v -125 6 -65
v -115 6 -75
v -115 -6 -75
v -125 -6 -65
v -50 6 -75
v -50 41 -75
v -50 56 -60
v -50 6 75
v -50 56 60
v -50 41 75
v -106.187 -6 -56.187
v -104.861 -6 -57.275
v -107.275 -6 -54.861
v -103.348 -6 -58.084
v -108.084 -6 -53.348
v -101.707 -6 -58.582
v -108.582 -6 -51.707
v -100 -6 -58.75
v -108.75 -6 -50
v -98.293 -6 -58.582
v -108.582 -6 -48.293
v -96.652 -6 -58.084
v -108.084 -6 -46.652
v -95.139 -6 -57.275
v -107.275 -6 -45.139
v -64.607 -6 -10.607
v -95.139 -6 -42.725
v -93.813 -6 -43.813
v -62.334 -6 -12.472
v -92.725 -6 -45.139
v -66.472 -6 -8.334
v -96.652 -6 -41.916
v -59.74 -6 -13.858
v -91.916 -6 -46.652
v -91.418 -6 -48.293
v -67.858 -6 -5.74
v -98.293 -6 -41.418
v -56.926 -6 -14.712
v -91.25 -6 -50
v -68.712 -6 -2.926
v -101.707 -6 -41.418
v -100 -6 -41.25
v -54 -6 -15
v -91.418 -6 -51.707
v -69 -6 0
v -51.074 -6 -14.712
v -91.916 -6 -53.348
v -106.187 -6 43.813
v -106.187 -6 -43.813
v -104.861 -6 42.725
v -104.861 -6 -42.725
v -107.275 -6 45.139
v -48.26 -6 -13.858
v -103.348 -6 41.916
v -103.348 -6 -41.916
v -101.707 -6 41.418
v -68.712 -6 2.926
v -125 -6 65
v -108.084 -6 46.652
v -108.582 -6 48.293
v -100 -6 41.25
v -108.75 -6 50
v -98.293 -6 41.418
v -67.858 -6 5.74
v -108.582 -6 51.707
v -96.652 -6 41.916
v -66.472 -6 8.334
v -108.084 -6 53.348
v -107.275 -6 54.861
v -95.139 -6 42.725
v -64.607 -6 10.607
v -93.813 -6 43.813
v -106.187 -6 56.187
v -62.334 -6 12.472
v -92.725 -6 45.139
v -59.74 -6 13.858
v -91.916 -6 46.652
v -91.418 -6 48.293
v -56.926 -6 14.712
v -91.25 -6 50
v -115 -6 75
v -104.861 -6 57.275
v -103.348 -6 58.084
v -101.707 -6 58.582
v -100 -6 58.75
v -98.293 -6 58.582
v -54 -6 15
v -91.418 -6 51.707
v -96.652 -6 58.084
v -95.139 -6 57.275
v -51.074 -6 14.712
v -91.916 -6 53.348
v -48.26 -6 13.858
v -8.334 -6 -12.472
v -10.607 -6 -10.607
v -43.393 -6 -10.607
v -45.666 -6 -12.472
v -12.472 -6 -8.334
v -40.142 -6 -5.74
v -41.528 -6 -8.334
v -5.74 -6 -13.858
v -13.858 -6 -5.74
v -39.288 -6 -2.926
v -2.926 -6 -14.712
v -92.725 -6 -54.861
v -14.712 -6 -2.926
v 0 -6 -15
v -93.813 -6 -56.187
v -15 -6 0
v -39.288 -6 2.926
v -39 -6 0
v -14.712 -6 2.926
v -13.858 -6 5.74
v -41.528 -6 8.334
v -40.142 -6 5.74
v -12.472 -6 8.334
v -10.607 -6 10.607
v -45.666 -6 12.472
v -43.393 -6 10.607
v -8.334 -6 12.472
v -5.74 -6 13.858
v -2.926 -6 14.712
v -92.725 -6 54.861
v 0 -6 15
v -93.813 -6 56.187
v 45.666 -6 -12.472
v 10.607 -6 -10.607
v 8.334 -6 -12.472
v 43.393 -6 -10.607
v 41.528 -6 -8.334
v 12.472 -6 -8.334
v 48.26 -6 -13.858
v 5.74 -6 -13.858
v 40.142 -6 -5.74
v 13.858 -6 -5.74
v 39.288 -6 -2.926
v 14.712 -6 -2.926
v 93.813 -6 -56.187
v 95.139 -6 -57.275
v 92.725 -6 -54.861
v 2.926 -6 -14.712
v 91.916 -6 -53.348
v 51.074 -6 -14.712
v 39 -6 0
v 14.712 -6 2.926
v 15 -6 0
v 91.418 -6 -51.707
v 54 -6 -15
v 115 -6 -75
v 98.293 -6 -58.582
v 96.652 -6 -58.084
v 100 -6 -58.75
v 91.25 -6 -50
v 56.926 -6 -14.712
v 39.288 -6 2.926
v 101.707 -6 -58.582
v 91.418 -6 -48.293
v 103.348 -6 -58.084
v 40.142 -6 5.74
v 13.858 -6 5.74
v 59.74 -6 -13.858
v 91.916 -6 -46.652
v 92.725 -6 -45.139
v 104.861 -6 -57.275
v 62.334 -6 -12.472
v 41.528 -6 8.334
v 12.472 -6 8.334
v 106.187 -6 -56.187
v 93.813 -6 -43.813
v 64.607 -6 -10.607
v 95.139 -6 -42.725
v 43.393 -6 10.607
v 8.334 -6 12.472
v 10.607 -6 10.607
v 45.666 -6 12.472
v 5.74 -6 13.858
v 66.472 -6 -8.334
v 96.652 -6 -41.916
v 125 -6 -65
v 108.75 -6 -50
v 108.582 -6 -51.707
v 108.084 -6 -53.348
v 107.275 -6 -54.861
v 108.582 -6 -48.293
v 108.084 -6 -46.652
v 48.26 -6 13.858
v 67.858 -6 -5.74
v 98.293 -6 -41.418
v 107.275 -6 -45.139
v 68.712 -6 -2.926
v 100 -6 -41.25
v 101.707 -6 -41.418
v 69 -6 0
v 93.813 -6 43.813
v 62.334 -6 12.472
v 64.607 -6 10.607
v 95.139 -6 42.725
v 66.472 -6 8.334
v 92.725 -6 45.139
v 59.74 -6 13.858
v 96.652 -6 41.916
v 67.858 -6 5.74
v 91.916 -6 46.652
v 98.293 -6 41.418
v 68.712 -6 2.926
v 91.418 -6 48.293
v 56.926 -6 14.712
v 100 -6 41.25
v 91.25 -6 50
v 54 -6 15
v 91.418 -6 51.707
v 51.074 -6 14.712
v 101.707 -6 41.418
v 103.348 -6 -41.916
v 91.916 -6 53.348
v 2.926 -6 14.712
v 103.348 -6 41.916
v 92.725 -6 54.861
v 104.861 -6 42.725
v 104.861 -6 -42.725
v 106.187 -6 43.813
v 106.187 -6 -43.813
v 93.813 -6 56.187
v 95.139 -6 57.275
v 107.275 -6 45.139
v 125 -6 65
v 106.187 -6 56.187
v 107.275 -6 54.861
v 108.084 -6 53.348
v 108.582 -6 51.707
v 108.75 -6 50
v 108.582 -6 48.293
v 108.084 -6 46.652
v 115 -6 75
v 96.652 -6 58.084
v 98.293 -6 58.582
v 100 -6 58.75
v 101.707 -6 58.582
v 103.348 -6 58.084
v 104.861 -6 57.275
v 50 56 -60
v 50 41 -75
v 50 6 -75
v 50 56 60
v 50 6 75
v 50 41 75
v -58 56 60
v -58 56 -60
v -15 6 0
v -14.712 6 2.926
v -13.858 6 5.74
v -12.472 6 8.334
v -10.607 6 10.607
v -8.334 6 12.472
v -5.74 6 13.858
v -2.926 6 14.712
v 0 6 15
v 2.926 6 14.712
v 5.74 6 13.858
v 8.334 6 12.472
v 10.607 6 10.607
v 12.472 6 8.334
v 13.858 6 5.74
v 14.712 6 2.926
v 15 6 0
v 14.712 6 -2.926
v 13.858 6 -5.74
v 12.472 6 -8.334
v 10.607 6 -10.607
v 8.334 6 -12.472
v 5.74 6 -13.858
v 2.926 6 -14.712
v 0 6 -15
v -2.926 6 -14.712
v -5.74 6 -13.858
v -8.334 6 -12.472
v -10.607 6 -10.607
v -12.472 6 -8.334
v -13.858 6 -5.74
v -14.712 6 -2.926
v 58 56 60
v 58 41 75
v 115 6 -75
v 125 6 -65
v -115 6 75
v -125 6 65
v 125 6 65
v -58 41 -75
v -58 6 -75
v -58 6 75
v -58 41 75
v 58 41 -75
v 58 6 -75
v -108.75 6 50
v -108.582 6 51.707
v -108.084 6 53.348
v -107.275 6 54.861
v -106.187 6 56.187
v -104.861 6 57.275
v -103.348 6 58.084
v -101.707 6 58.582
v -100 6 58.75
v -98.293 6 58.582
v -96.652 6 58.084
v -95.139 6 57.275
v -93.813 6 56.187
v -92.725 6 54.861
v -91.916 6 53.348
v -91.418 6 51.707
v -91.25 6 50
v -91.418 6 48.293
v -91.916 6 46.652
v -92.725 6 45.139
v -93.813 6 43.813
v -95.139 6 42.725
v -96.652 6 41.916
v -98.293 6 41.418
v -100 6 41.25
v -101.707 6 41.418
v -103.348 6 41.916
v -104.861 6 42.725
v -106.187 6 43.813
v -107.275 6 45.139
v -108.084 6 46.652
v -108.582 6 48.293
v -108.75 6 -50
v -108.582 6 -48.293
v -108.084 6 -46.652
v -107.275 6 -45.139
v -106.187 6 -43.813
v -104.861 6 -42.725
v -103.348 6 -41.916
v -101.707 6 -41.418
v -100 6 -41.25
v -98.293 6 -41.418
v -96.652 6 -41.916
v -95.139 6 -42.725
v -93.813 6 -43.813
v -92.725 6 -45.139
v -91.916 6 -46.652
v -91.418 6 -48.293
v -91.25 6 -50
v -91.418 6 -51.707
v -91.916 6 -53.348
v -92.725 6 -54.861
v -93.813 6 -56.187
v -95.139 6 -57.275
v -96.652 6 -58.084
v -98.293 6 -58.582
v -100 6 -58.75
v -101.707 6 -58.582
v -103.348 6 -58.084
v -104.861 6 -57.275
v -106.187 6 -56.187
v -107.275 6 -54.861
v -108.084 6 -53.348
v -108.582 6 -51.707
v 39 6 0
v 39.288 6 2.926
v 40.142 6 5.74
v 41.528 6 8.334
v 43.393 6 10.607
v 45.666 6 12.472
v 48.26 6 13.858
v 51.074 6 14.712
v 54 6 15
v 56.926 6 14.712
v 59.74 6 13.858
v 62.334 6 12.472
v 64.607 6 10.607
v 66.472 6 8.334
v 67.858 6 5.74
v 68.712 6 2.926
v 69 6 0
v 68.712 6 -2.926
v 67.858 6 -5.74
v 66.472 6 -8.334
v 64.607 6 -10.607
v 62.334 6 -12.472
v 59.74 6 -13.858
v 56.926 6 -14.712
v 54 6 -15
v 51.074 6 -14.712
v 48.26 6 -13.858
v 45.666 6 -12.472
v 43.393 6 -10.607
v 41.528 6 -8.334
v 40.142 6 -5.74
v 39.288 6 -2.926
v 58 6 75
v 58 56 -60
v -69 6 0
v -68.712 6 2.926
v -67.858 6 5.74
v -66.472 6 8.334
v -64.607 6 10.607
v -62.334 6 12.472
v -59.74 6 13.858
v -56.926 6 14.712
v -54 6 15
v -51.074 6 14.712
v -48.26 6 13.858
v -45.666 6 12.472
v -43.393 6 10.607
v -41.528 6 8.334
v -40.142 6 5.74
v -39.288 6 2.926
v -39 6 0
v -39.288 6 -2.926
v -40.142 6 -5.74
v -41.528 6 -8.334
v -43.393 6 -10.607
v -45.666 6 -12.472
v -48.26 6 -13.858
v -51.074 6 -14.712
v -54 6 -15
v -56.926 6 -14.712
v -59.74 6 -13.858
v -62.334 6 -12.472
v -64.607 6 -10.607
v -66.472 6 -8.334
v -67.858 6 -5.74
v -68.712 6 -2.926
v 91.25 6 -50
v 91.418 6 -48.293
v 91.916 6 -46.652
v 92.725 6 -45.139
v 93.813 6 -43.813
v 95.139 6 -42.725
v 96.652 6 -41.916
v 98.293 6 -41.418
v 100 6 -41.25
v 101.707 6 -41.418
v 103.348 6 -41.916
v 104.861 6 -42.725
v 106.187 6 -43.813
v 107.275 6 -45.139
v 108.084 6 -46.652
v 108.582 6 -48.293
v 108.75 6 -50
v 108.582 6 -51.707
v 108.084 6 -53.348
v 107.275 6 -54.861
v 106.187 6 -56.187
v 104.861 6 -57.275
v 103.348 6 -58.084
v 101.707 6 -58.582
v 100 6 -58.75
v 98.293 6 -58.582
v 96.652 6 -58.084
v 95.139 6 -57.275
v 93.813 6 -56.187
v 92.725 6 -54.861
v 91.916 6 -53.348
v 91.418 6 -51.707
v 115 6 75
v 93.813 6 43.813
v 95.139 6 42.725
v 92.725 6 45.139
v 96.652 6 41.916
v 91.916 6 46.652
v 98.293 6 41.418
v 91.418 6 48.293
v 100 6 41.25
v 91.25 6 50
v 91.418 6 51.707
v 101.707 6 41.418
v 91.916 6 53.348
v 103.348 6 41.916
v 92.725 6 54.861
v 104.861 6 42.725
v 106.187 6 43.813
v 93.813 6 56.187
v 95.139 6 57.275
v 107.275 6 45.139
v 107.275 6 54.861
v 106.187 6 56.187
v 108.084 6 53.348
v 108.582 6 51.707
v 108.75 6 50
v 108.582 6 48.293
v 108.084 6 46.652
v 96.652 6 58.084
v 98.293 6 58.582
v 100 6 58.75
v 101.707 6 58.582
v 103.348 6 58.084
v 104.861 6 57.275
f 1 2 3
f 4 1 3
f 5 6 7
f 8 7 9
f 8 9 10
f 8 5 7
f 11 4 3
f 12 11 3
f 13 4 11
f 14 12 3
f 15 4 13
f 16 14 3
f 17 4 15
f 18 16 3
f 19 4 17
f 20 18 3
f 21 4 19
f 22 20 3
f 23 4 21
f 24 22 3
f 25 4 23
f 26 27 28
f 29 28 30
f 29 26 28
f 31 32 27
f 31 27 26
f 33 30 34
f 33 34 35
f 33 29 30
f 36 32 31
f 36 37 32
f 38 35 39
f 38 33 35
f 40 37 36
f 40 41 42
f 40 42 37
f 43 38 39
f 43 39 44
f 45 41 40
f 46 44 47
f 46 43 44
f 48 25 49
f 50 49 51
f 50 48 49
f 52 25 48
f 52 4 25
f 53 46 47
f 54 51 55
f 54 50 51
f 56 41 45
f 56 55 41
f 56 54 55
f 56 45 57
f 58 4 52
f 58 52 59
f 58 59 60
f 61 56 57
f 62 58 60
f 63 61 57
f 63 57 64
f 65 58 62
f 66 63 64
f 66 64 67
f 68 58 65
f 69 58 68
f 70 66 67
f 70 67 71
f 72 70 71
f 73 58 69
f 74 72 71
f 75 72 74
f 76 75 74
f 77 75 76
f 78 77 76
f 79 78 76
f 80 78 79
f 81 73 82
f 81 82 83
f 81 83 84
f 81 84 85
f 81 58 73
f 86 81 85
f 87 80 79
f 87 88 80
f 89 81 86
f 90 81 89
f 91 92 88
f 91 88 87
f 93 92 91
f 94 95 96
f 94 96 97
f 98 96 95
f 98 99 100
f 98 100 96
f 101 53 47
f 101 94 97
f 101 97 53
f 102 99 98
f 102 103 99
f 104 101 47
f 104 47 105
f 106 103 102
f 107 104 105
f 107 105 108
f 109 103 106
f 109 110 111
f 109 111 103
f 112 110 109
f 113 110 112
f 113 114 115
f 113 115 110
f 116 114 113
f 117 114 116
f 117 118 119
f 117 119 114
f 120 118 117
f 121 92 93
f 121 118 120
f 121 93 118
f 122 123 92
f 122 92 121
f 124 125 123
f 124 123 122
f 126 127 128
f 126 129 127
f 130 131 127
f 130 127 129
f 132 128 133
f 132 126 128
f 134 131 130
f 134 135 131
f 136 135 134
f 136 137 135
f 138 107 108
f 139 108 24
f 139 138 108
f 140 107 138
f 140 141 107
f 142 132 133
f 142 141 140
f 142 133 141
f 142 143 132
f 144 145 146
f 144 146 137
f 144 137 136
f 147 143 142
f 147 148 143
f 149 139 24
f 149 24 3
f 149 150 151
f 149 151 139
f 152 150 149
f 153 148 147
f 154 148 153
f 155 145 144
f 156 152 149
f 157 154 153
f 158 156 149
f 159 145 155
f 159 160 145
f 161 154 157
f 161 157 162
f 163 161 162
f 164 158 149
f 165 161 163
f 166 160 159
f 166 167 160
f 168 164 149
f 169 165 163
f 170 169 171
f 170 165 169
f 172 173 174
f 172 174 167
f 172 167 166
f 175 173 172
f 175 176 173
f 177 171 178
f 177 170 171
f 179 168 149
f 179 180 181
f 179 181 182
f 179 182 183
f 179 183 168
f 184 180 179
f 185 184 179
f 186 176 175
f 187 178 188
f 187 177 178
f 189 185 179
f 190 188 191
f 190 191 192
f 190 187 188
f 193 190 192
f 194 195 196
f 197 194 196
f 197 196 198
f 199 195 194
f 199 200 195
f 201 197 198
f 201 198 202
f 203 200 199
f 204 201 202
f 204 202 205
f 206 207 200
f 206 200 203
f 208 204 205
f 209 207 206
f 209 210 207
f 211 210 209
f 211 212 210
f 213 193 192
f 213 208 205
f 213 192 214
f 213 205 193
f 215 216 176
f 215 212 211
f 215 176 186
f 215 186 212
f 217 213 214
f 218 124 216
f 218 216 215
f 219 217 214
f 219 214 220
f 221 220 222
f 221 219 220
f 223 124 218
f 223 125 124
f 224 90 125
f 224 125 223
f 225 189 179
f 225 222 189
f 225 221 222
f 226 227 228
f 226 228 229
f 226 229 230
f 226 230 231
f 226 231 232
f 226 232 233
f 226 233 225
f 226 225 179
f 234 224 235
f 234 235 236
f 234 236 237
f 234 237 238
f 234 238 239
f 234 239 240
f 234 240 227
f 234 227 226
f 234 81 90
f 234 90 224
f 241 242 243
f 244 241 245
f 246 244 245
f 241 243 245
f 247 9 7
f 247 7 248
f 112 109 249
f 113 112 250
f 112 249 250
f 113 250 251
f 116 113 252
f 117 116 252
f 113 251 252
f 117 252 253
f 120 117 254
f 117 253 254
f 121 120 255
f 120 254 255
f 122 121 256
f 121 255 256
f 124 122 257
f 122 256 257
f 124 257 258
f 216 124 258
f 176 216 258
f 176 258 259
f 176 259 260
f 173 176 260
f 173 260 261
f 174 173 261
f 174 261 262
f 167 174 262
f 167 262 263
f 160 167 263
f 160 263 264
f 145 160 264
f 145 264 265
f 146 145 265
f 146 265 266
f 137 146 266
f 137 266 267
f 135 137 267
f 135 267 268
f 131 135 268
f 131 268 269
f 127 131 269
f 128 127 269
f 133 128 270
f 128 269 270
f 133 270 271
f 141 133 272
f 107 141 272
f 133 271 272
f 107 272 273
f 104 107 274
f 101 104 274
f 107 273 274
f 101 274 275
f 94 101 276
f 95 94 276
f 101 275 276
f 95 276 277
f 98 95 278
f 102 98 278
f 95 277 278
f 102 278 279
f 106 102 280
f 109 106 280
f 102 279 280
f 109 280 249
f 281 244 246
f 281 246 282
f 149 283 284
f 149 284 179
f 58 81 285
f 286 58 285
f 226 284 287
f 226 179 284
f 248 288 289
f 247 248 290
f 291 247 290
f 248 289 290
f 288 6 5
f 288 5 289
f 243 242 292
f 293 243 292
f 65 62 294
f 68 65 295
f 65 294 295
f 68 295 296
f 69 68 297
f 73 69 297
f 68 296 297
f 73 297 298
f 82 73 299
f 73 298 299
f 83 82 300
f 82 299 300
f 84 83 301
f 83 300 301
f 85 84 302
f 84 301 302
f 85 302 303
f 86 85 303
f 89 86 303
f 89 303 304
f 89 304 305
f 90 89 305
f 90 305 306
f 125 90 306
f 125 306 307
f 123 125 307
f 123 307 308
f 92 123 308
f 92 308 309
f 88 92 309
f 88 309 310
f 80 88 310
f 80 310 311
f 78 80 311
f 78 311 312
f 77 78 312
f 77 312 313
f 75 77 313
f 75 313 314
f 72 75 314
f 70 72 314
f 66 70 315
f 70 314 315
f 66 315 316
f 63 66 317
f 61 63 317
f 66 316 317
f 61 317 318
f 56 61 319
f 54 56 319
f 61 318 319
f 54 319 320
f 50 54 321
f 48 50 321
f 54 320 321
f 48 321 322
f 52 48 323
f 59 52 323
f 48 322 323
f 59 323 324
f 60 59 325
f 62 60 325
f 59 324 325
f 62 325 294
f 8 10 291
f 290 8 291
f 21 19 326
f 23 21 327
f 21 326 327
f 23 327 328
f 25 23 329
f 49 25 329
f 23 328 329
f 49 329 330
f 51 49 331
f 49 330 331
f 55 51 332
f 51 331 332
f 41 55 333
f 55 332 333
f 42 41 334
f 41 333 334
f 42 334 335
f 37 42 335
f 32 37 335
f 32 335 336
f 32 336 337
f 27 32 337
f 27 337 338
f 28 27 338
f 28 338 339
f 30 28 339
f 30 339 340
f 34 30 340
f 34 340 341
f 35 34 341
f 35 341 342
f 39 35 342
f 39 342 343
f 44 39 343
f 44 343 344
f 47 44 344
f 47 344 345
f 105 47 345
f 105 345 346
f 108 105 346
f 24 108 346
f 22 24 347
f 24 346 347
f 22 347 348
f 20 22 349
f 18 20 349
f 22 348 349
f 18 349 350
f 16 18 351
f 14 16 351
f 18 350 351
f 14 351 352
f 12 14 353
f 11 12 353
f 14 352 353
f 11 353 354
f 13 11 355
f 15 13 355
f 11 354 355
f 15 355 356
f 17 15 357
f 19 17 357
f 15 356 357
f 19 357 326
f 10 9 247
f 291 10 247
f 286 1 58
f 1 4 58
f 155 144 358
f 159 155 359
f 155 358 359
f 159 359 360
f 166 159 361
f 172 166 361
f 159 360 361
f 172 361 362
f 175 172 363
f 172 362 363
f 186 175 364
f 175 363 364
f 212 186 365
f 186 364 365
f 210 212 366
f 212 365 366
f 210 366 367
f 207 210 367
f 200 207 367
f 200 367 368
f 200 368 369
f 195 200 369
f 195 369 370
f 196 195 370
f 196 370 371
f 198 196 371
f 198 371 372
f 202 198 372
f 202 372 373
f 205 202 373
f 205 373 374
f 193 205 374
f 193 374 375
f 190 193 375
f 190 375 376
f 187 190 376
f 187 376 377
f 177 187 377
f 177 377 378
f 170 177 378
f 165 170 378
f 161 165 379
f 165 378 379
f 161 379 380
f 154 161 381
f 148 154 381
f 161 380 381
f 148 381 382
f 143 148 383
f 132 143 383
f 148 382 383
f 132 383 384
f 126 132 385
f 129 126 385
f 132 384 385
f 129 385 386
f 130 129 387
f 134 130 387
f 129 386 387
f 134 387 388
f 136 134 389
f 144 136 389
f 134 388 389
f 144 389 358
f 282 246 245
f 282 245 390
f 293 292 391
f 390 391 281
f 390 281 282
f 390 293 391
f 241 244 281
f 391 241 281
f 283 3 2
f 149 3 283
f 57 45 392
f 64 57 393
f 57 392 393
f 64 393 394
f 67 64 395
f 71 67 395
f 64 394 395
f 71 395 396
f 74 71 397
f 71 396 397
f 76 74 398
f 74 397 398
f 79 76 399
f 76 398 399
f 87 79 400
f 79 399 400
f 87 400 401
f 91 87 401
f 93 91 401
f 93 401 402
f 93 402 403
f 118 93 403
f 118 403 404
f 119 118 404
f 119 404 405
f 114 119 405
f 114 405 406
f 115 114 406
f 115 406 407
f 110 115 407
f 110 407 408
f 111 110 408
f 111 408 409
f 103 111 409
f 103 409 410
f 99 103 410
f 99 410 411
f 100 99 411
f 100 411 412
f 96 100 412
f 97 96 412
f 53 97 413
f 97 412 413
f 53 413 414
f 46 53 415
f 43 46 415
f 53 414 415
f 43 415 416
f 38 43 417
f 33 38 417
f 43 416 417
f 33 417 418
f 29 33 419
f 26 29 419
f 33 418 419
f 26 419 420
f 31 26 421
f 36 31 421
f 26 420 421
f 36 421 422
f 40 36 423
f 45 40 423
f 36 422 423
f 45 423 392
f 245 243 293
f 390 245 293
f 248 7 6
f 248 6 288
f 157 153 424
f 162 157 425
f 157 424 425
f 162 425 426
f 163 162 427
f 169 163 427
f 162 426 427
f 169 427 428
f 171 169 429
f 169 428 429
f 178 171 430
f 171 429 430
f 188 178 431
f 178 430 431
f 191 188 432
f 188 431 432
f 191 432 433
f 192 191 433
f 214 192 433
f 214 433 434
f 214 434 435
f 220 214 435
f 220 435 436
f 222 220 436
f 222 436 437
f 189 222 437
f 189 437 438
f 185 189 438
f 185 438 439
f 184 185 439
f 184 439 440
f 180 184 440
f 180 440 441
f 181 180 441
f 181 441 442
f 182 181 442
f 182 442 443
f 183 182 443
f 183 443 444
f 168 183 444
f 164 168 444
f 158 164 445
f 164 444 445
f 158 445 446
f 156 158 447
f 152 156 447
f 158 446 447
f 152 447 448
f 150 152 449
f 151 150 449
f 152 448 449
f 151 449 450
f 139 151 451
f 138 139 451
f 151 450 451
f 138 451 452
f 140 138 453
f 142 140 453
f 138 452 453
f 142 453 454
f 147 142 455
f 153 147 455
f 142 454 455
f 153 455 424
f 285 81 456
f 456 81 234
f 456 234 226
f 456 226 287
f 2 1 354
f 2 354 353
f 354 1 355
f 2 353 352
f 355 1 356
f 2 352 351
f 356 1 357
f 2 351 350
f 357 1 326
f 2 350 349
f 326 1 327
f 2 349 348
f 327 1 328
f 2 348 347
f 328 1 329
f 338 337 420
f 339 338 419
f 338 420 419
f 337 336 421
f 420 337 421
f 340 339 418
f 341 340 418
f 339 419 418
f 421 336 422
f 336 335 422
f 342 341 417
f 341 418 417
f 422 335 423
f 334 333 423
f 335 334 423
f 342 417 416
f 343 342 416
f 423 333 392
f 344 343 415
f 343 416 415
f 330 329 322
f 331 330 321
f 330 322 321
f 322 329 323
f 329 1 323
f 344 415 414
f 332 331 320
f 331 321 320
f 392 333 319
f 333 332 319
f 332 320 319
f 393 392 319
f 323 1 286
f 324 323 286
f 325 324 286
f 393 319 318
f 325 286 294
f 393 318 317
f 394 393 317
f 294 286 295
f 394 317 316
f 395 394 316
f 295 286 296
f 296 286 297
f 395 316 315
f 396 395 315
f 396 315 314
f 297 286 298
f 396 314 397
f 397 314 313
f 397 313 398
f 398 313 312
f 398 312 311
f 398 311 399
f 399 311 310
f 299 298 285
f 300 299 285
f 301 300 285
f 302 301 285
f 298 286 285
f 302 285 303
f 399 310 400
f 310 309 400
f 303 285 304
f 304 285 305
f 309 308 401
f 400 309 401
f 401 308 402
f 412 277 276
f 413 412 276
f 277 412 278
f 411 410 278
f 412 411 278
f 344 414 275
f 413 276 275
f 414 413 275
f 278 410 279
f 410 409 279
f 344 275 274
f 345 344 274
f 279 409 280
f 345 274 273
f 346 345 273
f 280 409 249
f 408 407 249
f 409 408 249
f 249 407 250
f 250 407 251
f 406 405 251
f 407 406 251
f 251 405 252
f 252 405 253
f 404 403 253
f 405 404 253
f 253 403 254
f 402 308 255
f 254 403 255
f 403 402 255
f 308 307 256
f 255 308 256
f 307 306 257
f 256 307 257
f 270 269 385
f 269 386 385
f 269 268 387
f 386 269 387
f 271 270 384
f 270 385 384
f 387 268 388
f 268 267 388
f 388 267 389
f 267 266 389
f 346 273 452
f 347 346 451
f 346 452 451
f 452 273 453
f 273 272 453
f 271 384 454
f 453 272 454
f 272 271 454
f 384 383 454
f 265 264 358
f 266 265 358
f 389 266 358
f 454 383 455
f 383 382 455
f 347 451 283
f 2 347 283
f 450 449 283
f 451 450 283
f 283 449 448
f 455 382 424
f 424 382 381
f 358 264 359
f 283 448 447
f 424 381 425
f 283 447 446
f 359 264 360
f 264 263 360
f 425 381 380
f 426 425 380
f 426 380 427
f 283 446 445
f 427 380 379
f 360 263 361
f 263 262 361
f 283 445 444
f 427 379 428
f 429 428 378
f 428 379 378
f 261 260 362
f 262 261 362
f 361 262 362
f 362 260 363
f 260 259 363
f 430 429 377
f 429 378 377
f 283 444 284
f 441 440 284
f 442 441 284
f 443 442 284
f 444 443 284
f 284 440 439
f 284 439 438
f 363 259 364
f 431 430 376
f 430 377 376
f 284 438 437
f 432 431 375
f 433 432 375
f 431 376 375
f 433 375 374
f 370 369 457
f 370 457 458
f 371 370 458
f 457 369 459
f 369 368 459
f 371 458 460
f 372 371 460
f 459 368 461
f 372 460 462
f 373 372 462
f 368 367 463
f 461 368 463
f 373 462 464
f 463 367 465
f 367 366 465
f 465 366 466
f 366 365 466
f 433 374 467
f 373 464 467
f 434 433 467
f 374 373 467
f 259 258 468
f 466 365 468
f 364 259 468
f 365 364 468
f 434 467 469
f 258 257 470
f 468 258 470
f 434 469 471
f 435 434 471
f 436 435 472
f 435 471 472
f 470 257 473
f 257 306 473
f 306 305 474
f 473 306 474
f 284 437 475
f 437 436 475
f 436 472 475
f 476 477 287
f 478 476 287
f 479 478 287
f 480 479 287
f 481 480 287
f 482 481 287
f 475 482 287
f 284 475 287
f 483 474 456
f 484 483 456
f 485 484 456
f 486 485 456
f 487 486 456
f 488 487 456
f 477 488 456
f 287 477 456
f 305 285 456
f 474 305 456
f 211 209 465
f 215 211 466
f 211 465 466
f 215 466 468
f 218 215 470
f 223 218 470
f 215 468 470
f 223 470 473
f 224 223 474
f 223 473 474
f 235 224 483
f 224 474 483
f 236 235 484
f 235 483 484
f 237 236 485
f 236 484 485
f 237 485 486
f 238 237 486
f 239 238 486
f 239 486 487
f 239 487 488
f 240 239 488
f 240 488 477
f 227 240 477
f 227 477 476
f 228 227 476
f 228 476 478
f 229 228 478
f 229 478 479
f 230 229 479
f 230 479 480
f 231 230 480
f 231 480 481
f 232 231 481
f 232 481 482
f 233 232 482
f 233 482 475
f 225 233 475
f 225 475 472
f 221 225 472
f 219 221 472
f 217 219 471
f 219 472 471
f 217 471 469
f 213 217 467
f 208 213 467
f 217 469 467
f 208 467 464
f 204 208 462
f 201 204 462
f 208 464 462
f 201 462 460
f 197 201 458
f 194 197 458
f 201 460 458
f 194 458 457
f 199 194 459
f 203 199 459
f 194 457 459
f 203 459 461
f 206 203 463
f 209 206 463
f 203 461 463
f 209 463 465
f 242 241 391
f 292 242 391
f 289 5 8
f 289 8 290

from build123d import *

# Parameters (mm, degrees)
F0_W     = 250
F0_H     = 150
F1_DEPTH = 6
F2_SIZE  = 10
F4_D     = 17.5
F6_D     = 30
F7_W     = 8
F7_H     = 150
F8_DEPTH = 50
F9_SIZE  = 15


with BuildPart() as f1:
    # F0 (on Front) → F1 (new body, symmetric)
    with BuildSketch(Plane.XZ):
        Rectangle(F0_W, F0_H)
    extrude(amount=F1_DEPTH, both=True)

    # F2
    f2_edges = [f1.edges().sort_by_distance(p)[0] for p in [
        (125, 0, -75),
        (-125, 0, 75),
        (125, 0, 75),
        (-125, 0, -75),
    ]]
    chamfer(f2_edges, length=F2_SIZE)

    # F4 (through all)
    with Locations(Plane.XZ.offset(6)):
        with Locations((-100, 50), (-100, -50), (100, -50), (100, 50)):
            Hole(F4_D / 2)

    # F6 (through all)
    with Locations(Plane.XZ.offset(6)):
        with Locations((0, 0), (-54, 0), (54, 0)):
            Hole(F6_D / 2)


with BuildPart() as f8:
    # F7 (on face) → F8 (new body)
    with BuildSketch(Plane(origin=(0, 6, 0), x_dir=(-1, 0, 0), z_dir=(0, 1, 0))):
        with Locations((54, 0)):
            Rectangle(F7_W, F7_H)
    extrude(amount=F8_DEPTH)

    # F9
    f9_edges = [f8.edges().sort_by_distance(p)[0] for p in [
        (-54, 56, -75),
        (-54, 56, 75),
    ]]
    chamfer(f9_edges, length=F9_SIZE)


with BuildPart() as f10_1:
    # F10: instance of F8
    add(f8.part.mirror(Plane.YZ))


solid = Compound([f1.part, f8.part, f10_1.part])
